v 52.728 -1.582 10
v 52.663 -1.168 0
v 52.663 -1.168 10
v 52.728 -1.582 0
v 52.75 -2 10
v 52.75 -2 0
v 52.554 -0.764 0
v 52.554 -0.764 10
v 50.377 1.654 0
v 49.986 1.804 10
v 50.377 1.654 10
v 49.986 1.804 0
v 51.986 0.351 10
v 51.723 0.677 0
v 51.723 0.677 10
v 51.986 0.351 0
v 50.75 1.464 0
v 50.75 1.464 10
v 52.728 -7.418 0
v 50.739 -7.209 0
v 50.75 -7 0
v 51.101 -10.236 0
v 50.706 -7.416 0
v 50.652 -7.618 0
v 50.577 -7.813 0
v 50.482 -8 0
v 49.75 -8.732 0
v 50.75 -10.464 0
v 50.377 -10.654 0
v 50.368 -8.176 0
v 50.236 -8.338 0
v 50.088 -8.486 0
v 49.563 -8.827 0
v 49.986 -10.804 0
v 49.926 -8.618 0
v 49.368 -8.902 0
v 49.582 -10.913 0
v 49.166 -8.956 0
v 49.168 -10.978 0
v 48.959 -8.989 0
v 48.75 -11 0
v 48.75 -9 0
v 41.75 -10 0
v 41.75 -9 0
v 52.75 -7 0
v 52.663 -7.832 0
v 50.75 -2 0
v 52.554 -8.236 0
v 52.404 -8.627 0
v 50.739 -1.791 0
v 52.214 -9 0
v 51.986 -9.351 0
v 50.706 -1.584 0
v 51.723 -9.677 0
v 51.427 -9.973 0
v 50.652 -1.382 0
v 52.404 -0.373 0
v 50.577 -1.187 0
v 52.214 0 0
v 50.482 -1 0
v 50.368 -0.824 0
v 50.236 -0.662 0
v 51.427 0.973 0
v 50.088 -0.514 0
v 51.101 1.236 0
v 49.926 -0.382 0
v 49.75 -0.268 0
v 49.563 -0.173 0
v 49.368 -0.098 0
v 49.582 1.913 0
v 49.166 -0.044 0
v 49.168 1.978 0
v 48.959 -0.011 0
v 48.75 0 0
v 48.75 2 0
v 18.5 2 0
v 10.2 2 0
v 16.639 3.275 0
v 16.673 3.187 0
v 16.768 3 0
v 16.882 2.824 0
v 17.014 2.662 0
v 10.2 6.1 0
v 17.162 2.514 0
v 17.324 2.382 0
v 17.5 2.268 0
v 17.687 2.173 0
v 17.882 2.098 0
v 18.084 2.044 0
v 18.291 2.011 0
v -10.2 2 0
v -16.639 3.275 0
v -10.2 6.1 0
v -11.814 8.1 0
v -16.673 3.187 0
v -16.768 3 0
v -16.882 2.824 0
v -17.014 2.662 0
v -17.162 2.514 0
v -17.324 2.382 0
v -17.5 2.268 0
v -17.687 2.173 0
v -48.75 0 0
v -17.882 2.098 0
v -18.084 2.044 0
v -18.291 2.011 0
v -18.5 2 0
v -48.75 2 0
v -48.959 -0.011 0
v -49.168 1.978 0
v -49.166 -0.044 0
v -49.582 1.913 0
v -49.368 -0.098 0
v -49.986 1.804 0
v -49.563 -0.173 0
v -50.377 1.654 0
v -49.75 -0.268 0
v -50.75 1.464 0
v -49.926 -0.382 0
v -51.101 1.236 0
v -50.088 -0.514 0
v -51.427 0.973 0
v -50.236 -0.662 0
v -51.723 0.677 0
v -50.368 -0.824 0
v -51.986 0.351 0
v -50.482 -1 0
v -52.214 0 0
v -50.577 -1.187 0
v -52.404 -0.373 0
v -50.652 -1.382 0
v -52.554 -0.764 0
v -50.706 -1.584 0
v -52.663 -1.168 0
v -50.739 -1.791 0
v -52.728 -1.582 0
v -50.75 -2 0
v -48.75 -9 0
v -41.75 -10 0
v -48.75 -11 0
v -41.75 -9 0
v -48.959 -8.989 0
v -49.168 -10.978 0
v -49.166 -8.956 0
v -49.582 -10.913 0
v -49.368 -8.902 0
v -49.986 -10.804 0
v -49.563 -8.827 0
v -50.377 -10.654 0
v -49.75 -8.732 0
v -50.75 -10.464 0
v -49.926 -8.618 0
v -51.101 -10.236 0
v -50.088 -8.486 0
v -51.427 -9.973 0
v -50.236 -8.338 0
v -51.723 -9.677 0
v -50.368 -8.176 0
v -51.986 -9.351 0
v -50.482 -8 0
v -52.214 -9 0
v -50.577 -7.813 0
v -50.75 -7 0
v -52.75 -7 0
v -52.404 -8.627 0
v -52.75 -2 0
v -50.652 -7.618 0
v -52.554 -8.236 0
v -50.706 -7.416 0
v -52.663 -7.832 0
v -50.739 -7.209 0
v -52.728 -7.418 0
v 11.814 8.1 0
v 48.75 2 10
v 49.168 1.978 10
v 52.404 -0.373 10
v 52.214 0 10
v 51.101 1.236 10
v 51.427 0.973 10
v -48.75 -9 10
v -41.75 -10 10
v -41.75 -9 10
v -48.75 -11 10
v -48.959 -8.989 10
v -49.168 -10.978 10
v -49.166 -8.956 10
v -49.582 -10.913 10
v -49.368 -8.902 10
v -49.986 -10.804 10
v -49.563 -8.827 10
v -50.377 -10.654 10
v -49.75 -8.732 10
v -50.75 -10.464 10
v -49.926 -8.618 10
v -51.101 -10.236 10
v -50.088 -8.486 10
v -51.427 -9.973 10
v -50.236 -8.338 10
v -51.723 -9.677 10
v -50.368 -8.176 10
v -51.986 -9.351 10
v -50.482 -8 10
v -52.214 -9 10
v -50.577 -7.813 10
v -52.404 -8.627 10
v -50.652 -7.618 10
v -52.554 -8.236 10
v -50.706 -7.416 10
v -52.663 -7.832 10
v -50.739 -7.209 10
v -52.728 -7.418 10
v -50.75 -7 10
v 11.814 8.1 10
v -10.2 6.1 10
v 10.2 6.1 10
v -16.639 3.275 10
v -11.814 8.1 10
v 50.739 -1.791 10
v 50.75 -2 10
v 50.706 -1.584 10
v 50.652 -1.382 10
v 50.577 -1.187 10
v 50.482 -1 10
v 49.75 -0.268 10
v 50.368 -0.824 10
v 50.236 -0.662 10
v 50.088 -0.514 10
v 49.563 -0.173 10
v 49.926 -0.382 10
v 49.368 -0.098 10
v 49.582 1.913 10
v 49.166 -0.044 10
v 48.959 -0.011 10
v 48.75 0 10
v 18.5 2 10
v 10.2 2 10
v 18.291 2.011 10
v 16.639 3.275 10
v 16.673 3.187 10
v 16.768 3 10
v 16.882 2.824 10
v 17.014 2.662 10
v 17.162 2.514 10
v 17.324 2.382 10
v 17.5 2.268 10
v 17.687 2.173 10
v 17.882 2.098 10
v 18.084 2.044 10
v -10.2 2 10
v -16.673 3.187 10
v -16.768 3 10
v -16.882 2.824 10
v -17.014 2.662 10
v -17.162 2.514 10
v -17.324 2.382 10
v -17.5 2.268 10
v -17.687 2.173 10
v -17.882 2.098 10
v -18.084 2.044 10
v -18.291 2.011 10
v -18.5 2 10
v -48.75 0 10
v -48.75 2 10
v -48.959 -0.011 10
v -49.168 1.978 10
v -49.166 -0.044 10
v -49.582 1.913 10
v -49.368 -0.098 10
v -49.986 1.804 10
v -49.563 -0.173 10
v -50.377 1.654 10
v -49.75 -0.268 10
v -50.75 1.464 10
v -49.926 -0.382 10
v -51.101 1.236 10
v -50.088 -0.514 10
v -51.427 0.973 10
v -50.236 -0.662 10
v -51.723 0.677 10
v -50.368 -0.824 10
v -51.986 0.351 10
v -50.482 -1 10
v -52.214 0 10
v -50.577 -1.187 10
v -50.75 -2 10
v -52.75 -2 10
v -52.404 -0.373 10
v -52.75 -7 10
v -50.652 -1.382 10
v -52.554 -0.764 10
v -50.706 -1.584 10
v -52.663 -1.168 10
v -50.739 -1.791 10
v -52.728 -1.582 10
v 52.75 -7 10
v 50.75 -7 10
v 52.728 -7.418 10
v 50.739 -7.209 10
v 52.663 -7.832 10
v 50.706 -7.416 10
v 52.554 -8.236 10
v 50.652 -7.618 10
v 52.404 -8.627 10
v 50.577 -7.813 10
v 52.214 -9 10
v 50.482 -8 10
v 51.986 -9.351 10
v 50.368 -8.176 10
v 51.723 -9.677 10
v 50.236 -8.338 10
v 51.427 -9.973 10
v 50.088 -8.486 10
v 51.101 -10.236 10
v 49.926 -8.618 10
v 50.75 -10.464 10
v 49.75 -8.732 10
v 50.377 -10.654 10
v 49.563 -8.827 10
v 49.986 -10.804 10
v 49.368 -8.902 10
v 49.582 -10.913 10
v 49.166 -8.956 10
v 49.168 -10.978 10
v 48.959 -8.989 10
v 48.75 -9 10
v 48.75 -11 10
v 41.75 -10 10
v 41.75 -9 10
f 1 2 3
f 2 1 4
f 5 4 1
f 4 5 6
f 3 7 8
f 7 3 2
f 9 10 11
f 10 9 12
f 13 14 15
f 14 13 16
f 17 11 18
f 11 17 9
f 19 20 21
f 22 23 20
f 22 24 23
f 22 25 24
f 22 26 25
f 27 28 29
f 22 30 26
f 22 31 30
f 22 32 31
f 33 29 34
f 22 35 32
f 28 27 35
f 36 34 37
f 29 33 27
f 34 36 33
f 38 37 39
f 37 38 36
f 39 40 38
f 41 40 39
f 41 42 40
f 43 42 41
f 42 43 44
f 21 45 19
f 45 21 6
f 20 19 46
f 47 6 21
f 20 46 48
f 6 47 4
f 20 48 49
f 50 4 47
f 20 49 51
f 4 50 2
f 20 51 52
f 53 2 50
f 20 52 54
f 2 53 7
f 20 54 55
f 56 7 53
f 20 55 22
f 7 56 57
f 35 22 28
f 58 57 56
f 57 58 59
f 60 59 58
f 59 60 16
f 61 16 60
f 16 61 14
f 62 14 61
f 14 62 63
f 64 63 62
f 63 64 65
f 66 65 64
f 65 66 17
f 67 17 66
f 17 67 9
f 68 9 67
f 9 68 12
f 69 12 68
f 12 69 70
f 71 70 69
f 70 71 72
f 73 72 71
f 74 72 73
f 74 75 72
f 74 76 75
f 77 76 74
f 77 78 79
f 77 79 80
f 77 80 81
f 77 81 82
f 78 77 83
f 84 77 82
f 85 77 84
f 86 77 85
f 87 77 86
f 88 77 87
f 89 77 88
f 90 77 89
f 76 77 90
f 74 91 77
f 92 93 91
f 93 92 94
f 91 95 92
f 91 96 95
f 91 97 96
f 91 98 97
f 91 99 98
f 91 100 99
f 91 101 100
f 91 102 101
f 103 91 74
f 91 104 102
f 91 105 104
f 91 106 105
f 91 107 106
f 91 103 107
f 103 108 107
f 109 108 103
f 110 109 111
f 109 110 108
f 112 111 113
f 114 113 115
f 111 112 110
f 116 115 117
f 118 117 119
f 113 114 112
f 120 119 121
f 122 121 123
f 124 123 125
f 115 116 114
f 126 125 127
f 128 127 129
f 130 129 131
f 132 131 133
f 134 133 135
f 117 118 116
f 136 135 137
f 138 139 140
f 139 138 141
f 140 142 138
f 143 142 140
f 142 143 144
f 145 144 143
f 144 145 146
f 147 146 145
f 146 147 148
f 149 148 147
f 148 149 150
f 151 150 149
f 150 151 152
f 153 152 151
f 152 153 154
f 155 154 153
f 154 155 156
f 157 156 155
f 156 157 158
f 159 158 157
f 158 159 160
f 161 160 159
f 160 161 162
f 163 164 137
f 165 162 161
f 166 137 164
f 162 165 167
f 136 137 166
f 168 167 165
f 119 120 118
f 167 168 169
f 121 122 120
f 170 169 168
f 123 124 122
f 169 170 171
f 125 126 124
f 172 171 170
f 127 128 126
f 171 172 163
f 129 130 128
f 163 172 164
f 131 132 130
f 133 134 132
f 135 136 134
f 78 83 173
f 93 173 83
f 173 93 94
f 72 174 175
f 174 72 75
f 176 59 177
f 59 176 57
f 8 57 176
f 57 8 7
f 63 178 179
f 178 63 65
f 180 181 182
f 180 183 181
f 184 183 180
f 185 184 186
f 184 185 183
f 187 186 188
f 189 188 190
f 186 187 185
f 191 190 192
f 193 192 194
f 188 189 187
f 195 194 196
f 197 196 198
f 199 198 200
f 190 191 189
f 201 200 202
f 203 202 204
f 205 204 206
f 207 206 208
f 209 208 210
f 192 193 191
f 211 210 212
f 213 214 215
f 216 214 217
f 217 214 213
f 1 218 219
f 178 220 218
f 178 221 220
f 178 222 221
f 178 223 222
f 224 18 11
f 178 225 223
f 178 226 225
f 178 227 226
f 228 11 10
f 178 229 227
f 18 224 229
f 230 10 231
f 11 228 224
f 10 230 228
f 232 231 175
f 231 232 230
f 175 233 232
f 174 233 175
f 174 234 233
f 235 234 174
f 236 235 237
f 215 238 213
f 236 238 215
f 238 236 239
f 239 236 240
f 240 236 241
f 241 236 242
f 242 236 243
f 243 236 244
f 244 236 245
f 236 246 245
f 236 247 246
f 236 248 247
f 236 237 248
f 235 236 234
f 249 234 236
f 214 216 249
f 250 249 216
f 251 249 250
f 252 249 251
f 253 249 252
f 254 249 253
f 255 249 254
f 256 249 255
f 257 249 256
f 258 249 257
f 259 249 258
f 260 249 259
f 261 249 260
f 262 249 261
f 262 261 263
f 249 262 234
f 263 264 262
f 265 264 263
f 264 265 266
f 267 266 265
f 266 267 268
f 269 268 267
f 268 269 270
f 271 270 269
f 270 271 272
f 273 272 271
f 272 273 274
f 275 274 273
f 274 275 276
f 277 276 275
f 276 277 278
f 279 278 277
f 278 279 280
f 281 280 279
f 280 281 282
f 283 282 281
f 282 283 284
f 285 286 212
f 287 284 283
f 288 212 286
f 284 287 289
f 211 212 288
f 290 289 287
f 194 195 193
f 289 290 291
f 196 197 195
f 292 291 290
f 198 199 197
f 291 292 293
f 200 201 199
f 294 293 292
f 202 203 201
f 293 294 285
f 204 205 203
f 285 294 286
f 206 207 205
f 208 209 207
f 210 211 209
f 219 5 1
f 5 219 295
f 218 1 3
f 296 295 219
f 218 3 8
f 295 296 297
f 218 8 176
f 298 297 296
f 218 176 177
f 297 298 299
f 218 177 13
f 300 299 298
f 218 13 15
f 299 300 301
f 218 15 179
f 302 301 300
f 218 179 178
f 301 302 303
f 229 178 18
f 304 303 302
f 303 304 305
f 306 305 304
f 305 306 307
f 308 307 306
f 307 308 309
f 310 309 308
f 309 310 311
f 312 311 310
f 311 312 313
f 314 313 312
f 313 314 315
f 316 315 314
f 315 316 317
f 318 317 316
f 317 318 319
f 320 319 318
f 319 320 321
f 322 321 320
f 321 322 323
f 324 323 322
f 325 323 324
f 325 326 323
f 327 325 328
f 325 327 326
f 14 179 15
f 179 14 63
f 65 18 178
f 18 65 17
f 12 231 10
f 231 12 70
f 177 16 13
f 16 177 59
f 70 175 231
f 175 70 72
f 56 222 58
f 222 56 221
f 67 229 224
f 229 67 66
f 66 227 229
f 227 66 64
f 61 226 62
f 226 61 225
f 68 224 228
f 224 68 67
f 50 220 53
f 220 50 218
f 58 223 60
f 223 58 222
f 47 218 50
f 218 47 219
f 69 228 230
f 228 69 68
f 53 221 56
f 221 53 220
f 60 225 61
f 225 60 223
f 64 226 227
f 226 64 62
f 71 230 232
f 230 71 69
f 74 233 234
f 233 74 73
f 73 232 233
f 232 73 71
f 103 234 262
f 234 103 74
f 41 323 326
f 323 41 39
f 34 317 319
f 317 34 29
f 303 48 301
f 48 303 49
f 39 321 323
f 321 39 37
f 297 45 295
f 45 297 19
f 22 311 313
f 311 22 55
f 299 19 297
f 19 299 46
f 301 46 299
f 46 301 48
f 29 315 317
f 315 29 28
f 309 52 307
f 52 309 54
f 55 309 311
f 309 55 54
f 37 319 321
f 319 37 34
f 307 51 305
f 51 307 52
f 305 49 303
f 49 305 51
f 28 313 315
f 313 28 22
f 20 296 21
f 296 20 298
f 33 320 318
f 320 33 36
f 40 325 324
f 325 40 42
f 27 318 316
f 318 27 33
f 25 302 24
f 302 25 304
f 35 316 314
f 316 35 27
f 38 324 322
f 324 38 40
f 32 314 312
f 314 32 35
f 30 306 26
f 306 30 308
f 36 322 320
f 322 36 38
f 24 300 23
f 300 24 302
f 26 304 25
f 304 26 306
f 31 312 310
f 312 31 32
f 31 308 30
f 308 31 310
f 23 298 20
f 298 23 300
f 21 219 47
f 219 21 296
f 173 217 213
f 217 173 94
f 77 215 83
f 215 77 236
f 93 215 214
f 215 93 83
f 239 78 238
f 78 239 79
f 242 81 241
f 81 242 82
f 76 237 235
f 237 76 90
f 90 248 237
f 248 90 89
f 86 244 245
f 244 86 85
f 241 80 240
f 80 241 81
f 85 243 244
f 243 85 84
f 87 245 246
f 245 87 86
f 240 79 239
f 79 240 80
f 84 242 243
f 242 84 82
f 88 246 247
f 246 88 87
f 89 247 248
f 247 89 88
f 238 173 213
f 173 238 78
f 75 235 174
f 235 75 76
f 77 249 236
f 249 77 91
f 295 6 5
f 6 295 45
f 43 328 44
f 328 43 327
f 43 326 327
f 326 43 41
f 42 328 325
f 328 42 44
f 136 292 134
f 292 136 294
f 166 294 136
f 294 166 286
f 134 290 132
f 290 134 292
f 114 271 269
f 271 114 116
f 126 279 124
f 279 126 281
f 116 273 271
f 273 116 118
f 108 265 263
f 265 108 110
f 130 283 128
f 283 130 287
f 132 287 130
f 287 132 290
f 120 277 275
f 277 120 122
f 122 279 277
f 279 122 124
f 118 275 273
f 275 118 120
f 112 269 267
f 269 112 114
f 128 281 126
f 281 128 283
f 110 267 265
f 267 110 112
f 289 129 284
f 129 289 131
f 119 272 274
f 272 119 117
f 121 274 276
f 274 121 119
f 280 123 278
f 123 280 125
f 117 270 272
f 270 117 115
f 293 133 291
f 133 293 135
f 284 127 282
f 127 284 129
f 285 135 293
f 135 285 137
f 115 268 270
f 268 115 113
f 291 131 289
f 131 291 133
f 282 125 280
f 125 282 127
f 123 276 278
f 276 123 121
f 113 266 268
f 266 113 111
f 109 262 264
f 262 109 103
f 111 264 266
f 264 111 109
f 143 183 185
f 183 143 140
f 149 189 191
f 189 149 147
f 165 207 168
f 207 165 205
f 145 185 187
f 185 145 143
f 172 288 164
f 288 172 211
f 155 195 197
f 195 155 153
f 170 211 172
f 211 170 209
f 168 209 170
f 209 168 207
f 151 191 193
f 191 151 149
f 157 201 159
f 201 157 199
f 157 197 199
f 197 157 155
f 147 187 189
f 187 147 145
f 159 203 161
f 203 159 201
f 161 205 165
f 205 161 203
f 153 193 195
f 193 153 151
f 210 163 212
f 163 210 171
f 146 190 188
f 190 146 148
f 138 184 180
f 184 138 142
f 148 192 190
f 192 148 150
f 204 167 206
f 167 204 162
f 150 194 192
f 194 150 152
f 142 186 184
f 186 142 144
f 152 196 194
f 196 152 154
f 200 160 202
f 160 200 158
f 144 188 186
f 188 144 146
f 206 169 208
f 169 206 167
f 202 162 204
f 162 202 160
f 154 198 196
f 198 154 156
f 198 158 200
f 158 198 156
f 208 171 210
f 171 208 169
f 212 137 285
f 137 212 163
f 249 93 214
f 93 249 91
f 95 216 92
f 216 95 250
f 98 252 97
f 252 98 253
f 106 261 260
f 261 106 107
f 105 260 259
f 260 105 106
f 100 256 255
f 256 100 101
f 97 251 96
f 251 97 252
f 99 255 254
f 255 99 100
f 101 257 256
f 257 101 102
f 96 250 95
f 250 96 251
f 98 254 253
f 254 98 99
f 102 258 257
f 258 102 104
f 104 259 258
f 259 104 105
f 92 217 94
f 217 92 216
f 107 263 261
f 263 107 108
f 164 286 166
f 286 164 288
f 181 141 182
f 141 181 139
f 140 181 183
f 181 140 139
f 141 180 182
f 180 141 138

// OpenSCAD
// Values are for TomTom Start 60

// Height of device, measured where bracket will be placed.
device_height=101.5;

// Depth of device; measured near border of device.
device_depth=9;

// Bracket height, must correspond to latch space at bar. 10 is a reasonable value.
height=10;

// Hook in front of the device.
hook_length=7;


/* [Hidden] */
// Values for Xperia Active
// device_height=55;
// device_depth=16;
// hook_length=7;

// no changes below this line
// --------------------------
// device independent, must fit connector
thickness=2;


// convert to object internal values
width=device_height-2*thickness;
depth=device_depth-2*thickness;

module arm () {
// main beam
cube([width/2, thickness, height]);

// first corner

difference() {
  difference() {
    translate([width/2,-thickness,0])cylinder(r=2*thickness, h=height, $fn=60);
    translate([width/2,-thickness,0])cylinder(r=thickness, h=height, $fn=60);
  }
  union() {
    translate([width/2-2*thickness,-3*thickness,0])cube([2*thickness,3*thickness, height]);
    translate([width/2,-3*thickness,0])cube([2*thickness,2*thickness, height]);
  }
};

// short beam
translate([width/2+thickness,-thickness-depth,0])cube([thickness,depth,height]);

// second corner
difference() {
  difference() {
    translate([width/2,-thickness-depth,0])cylinder(r=2*thickness, h=height, $fn=60);
    translate([width/2,-thickness-depth,0])cylinder(r=thickness, h=height, $fn=60);
  }
  union() {
    translate([width/2-2*thickness,-3*thickness-depth,0])cube([2*thickness,4*thickness, height]);
    translate([width/2-thickness,-thickness-depth,0])cube([2*thickness,2*thickness, height]);
  }
};

// make end hook and move in place
translate([width/2-hook_length,-thickness*2-depth,0])
  linear_extrude(height=height)polygon(points=[[0,0],[hook_length,0],[hook_length,-thickness],[0,-thickness/2]]);

// do not change, this is the connector part
fixation_outer_width=37;
fixation_inner_width=20.4;
fixation_inner_depth=6.1;
fixation_outer_depth=fixation_inner_depth+2;

difference () {
 difference () {
  difference () {
    cube([fixation_outer_width/2, fixation_outer_depth, height]);
    cube([fixation_inner_width/2, fixation_inner_depth, height]);
   }
   translate([fixation_outer_width/2,thickness+2,0])cylinder(r=2, h=height, $fn=60);
 }
 translate([fixation_outer_width/2-sqrt(2),sqrt(2)*2,0])rotate(45)cube([10,10,height]);
};
};
// end module arm

arm();
mirror() arm();
